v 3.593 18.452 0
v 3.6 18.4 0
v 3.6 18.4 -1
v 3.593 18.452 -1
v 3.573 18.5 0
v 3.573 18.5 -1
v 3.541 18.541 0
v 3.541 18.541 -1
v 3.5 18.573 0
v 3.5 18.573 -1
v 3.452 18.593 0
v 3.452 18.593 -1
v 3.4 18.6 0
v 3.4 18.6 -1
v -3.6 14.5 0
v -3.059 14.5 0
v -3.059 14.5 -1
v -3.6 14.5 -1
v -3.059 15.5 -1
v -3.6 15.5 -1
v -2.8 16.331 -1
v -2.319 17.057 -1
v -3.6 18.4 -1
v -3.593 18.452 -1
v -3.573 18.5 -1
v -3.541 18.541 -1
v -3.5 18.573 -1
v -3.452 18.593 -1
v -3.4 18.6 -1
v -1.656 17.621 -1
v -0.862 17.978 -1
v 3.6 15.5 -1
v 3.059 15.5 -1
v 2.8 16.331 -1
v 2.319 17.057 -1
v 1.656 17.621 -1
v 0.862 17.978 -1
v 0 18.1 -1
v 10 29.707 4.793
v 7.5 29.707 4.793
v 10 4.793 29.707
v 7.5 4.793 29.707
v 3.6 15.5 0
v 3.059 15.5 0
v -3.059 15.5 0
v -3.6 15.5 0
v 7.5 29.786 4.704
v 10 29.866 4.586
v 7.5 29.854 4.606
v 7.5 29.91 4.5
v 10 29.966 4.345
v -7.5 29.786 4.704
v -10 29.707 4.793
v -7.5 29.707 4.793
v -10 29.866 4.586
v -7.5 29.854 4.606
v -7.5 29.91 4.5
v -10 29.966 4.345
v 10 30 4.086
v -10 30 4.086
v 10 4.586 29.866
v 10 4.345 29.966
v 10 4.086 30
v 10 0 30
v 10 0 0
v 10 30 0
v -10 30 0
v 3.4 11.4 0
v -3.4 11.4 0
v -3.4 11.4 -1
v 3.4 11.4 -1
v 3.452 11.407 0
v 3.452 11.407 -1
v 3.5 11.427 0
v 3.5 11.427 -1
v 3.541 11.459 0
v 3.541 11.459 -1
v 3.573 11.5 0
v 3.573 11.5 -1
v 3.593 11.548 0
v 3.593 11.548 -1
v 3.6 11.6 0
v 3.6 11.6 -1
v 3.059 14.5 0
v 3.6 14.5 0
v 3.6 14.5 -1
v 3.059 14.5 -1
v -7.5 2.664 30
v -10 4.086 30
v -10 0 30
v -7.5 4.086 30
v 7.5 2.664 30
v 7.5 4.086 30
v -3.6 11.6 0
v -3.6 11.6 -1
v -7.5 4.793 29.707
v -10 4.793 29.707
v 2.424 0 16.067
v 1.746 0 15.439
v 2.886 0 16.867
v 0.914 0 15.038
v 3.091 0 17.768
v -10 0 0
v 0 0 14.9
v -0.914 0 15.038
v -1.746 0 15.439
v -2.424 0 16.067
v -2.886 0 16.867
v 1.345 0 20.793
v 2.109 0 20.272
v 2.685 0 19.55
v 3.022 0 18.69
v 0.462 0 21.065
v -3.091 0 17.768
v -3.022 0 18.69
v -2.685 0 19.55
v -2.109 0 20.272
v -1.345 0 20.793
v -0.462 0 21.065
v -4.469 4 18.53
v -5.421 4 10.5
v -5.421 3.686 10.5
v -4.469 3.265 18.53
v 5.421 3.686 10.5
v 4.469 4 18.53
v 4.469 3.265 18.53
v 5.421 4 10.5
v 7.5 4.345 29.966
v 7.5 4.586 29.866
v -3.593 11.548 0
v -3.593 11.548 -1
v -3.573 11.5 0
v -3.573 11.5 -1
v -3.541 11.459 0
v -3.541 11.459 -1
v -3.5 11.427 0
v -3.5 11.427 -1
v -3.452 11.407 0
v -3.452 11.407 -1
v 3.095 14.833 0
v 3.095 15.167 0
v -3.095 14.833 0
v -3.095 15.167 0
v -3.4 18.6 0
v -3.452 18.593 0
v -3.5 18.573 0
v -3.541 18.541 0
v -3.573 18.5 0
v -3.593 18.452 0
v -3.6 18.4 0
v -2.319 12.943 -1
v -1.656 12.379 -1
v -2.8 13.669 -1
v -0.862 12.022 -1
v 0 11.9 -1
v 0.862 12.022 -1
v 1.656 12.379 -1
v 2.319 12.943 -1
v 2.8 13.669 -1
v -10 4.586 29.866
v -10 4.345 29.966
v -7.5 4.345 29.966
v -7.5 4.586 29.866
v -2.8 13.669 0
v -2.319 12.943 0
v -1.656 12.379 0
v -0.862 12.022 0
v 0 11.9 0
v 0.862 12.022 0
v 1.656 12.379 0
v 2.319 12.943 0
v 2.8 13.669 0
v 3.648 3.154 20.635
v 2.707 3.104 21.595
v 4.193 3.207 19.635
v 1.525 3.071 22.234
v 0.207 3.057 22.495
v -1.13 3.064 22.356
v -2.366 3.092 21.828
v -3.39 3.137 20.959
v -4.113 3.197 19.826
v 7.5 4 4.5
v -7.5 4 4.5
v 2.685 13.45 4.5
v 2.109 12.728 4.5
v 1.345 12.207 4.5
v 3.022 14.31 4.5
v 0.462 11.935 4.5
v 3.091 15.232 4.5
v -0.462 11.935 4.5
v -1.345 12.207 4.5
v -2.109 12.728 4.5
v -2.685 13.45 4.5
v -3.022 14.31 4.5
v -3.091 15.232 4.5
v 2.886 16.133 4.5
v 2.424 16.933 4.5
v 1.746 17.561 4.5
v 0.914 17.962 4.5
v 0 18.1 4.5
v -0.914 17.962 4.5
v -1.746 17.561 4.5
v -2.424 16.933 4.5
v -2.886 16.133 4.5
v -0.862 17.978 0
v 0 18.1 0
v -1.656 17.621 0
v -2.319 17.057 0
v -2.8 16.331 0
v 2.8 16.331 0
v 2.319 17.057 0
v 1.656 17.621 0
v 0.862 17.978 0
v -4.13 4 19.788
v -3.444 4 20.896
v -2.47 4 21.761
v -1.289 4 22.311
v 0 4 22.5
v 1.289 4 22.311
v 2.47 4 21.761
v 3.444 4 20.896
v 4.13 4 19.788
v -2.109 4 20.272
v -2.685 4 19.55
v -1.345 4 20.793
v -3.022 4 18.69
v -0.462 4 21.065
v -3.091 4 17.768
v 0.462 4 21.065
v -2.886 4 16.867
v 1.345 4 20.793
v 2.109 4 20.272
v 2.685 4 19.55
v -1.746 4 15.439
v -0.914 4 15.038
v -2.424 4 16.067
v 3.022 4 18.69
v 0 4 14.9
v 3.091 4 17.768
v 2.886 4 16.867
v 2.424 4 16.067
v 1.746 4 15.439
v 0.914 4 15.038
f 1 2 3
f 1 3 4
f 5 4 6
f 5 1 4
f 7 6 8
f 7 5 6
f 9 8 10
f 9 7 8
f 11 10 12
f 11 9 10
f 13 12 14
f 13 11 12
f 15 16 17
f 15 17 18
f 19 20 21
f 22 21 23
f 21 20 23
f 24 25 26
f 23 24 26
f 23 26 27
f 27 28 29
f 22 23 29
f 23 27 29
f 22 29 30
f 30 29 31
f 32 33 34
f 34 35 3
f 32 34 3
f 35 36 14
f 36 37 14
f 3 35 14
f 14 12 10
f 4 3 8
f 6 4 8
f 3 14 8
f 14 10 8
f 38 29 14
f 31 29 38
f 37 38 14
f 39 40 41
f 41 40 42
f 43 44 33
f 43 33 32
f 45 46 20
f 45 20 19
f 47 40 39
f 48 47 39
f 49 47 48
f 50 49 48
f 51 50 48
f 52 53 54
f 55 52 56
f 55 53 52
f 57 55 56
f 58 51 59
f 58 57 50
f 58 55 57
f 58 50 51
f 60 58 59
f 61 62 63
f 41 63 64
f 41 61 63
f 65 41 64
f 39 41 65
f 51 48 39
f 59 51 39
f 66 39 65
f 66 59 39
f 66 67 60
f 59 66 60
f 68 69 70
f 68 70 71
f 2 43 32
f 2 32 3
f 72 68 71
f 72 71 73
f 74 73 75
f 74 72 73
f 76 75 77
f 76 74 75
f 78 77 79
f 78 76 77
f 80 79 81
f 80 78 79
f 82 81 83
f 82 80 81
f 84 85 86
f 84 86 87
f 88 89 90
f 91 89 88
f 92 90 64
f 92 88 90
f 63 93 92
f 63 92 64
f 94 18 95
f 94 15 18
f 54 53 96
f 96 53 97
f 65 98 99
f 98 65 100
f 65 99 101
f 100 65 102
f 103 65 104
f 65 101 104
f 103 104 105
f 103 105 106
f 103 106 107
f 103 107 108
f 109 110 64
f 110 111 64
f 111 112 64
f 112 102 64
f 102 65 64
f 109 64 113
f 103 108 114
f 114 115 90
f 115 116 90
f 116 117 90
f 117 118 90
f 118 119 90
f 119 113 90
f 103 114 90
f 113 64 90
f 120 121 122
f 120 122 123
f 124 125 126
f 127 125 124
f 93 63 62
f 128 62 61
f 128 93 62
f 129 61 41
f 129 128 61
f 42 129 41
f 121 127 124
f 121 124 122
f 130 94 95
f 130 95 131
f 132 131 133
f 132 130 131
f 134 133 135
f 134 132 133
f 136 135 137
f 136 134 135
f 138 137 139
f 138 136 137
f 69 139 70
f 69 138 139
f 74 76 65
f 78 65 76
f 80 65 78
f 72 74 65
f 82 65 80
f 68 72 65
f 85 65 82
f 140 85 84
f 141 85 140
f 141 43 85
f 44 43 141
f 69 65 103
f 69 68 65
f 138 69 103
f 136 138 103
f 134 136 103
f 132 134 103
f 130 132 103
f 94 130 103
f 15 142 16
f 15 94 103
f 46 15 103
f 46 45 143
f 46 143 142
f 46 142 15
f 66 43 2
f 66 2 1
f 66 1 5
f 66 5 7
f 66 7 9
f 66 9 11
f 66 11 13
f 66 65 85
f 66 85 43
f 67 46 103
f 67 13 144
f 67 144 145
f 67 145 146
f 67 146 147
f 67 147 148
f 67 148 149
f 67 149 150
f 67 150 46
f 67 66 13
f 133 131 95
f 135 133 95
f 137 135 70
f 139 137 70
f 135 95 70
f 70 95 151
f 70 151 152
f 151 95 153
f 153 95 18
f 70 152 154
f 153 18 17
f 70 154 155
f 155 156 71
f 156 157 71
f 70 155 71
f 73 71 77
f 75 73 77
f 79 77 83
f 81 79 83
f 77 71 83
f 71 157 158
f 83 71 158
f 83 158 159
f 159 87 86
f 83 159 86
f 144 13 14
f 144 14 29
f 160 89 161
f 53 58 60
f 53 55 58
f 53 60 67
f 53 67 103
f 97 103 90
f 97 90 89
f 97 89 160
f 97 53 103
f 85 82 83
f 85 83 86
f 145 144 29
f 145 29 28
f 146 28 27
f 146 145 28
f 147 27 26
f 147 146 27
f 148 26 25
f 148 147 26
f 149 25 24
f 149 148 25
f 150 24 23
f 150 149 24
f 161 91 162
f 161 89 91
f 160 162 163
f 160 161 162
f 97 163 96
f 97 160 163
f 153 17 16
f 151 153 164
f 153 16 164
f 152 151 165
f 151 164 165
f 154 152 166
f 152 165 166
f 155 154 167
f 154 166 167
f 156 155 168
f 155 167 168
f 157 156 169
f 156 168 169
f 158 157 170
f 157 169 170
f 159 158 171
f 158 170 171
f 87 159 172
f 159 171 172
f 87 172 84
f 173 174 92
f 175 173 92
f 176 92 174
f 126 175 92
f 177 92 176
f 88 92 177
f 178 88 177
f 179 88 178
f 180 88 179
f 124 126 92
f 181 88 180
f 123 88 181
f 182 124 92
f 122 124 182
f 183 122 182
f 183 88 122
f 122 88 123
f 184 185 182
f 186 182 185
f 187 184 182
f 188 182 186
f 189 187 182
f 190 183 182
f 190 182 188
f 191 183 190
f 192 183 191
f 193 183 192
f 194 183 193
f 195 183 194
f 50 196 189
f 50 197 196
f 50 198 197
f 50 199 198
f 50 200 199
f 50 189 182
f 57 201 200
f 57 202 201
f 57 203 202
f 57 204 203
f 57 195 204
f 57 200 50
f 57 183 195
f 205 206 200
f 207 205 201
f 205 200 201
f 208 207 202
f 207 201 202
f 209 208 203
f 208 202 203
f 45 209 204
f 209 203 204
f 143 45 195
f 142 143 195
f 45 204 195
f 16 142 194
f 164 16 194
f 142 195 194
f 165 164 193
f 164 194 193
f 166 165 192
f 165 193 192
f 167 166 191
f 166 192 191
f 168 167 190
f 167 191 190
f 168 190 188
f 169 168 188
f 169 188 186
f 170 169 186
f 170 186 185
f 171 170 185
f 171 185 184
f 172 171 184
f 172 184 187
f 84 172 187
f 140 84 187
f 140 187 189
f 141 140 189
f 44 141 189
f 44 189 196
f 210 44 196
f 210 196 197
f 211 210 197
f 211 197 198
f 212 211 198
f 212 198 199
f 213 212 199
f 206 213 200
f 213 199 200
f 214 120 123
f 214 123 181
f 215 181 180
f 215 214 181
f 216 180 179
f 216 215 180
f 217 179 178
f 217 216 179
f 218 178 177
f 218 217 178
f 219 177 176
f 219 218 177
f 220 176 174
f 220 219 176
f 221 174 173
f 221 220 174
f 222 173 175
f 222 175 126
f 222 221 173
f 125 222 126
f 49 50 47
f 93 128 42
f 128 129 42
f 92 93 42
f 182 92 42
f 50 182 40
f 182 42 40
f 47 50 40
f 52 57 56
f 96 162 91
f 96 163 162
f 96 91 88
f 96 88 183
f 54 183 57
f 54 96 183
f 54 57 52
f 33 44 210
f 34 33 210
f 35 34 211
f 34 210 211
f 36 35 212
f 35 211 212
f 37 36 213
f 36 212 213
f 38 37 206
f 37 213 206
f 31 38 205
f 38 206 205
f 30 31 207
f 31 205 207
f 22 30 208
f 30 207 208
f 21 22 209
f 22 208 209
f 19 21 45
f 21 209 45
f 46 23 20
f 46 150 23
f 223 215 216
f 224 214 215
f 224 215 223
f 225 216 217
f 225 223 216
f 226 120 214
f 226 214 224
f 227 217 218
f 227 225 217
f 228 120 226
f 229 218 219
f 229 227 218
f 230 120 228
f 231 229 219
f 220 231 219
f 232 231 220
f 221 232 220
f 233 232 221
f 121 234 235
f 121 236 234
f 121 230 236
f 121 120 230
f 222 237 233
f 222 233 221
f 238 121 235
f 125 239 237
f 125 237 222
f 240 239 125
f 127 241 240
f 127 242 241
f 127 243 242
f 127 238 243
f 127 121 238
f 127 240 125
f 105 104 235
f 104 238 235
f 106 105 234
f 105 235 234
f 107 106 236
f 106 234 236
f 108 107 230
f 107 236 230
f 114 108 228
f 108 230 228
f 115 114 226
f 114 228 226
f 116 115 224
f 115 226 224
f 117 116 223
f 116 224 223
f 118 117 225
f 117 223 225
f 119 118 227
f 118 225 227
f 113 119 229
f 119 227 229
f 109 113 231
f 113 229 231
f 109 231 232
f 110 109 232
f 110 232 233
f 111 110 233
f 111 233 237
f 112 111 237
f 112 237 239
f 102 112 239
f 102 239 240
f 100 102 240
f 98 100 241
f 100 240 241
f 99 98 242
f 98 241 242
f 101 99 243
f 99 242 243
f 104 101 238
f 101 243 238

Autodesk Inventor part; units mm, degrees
sketch "Sketch_15" plane through (0, 0, 0) normal (1, 0, 0) x (0, 1, 0)
  line L0 (0, 30) -> (0, 0)
  line L1 (0, 0) -> (30, 0)
  line L2 (30, 0) -> (30, 4.0858)
  arc A0 (30, 4.0858) -> (29.7071, 4.7929) centre (29, 4.0858) ccw
  line L3 (29.7071, 4.7929) -> (4.7929, 29.7071)
  arc A1 (4.7929, 29.7071) -> (4.0858, 30) centre (4.0858, 29) ccw
  line L4 (4.0858, 30) -> (0, 30)
extrude "Extrusion1" add sketch "Sketch_15" along normal mid plane 20
sketch "Sketch_16" plane through (0, 0, 0) normal (1, 0, 0) x (0, 1, 0)
  line L0 (2.9278, 34.5) -> (4.4738, 5)
  line L1 (4.4738, 5) -> (34.5, 5)
  line L2 (34.5, 5) -> (34.5, 34.5)
  line L3 (34.5, 34.5) -> (2.9278, 34.5)
extrude "Extrusion2" cut sketch "Sketch_16" along normal mid plane 15
sketch "Sketch_82" plane through (0, 0, 0) normal (1, 0, 0) x (0, 1, 0)
  line L0 (2.4278, 34.5) -> (4, 4.5)
  line L1 (4, 4.5) -> (34, 4.5)
  line L2 (34, 4.5) -> (34, 34.5)
  line L3 (34, 34.5) -> (2.4278, 34.5)
extrude "Extrusion3" cut sketch "Sketch_82" along normal mid plane 15
sketch "Sketch_17" plane through (0, 4.5, 0) normal (0, 1, 0) x (1, 0, 0)
  line L0 (-5.4209, -10.5) -> (-4.4687, -18.5299)
  arc A0 (-4.4687, -18.5299) -> (4.4687, -18.5299) centre (0, -18) ccw
  line L1 (4.4687, -18.5299) -> (5.4209, -10.5)
  line L2 (5.4209, -10.5) -> (-5.4209, -10.5)
extrude "Extrusion4" add sketch "Sketch_17" against normal blind 2.25
sketch "Sketch5" plane through (10, 0, 0) normal (0, 0, -1) x (-1, 0, 0)
  point P0 (10, 15)
hole "Hole1" at (0, 15, 0) direction (0, 0, 1) diameter 6.2 depth 5.5
sketch "Sketch6" plane through (-10, 0, 30) normal (0, -1, 0) x (1, 0, 0)
  point P0 (10, -12)
hole "Hole2" at (0, 0, 18) direction (0, 1, 0) diameter 6.2 depth 4.5
sketch "Sketch_1" plane through (0, 0, 0) normal (0, 1, 0) x (-1, 0, 0)
  line L0 (10, 0) -> (10, 30)
  line L1 (10, 30) -> (-10, 30)
  line L2 (-10, 30) -> (-10, 0)
  line L3 (-10, 0) -> (10, 0)
extrude "Extrusion5" add sketch "Sketch_1" against normal blind 1
sketch "Sketch_4" plane through (0, 0, 0) normal (0, 1, 0) x (-1, 0, 0)
  line L0 (10, 0) -> (10, 30)
  line L1 (10, 30) -> (-10, 30)
  line L2 (-10, 30) -> (-10, 0)
  line L3 (-10, 0) -> (10, 0)
extrude "Extrusion6" cut sketch "Sketch_4" against normal blind 1
sketch "Sketch_72" plane through (0, 0, 0) normal (0, 0, 1) x (1, 0, 0)
  line L0 (-3.6, 14.5) -> (-3.6, 11.6)
  arc A0 (-3.6, 11.6) -> (-3.4, 11.4) centre (-3.4, 11.6) ccw
  line L1 (-3.4, 11.4) -> (3.4, 11.4)
  arc A1 (3.4, 11.4) -> (3.6, 11.6) centre (3.4, 11.6) ccw
  line L2 (3.6, 11.6) -> (3.6, 14.5)
  line L3 (3.6, 14.5) -> (3.0594, 14.5)
  arc A2 (-3.0594, 14.5) -> (3.0594, 14.5) centre (0, 15) ccw
  line L4 (-3.0594, 14.5) -> (-3.6, 14.5)
extrude "Extrusion7" add sketch "Sketch_72" against normal blind 1
sketch "Sketch_73" plane through (0, 0, 0) normal (0, 0, 1) x (1, 0, 0)
  line L0 (-3.6, 15.5) -> (-3.0594, 15.5)
  arc A0 (3.0594, 15.5) -> (-3.0594, 15.5) centre (0, 15) ccw
  line L1 (3.0594, 15.5) -> (3.6, 15.5)
  line L2 (3.6, 15.5) -> (3.6, 18.4)
  arc A1 (3.6, 18.4) -> (3.4, 18.6) centre (3.4, 18.4) ccw
  line L3 (3.4, 18.6) -> (-3.4, 18.6)
  arc A2 (-3.4, 18.6) -> (-3.6, 18.4) centre (-3.4, 18.4) ccw
  line L4 (-3.6, 18.4) -> (-3.6, 15.5)
extrude "Extrusion8" add sketch "Sketch_73" against normal blind 1
sketch "Sketch_86" plane through (0, 4.5, 0) normal (0, 1, 0) x (1, 0, 0)
  line L0 (-5.4209, -10.5) -> (-4.4687, -18.5299)
  arc A0 (-4.4687, -18.5299) -> (4.4687, -18.5299) centre (0, -18) ccw
  line L1 (4.4687, -18.5299) -> (5.4209, -10.5)
  line L2 (5.4209, -10.5) -> (-5.4209, -10.5)
extrude "Extrusion9" cut sketch "Sketch_86" against normal blind 0.5
ref_plane "SD6_50_1_XY" through (-10, 15, 4.5) normal (0, 0, 1) x (1, 0, 0)
ref_plane "SD6_50_1_YZ" through (-10, 15, 4.5) normal (1, 0, 0) x (0, 1, 0)
ref_plane "SD6_50_1_ZX" through (-10, 15, 4.5) normal (0, 1, 0) x (0, 0, 1)
ref_plane "SD6_50_2_XY" through (10, 15, 4.5) normal (0, 0, 1) x (1, 0, 0)
ref_plane "SD6_50_2_YZ" through (10, 15, 4.5) normal (1, 0, 0) x (0, 1, 0)
ref_plane "SD6_50_2_ZX" through (10, 15, 4.5) normal (0, 1, 0) x (0, 0, 1)
ref_plane "SD6_50_3_XY" through (-10, 4.5, 18) normal (0, 1, 0) x (1, 0, 0)
ref_plane "SD6_50_3_YZ" through (-10, 4.5, 18) normal (1, 0, 0) x (0, 0, -1)
ref_plane "SD6_50_3_ZX" through (-10, 4.5, 18) normal (0, 0, -1) x (0, 1, 0)
ref_plane "SD6_50_4_XY" through (10, 4.5, 18) normal (0, 1, 0) x (1, 0, 0)
ref_plane "SD6_50_4_YZ" through (10, 4.5, 18) normal (1, 0, 0) x (0, 0, -1)
ref_plane "SD6_50_4_ZX" through (10, 4.5, 18) normal (0, 0, -1) x (0, 1, 0)
ref_plane "a10_to_bolt_XY" through (15, 15, 4.5) normal (0, 0, 1) x (1, 0, 0)
ref_plane "a10_to_bolt_YZ" through (15, 15, 4.5) normal (1, 0, 0) x (0, 1, 0)
ref_plane "a10_to_bolt_ZX" through (15, 15, 4.5) normal (0, 1, 0) x (0, 0, 1)
ref_plane "a11_to_bolt_XY" through (-15, 4.5, 18) normal (0, 1, 0) x (1, 0, 0)
ref_plane "a11_to_bolt_YZ" through (-15, 4.5, 18) normal (1, 0, 0) x (0, 0, -1)
ref_plane "a11_to_bolt_ZX" through (-15, 4.5, 18) normal (0, 0, -1) x (0, 1, 0)
ref_plane "a12_to_bolt_XY" through (15, 4.5, 18) normal (0, 1, 0) x (1, 0, 0)
ref_plane "a12_to_bolt_YZ" through (15, 4.5, 18) normal (1, 0, 0) x (0, 0, -1)
ref_plane "a12_to_bolt_ZX" through (15, 4.5, 18) normal (0, 0, -1) x (0, 1, 0)
ref_plane "a13_to_bolt_XY" through (0, 4.5, 38) normal (0, 1, 0) x (1, 0, 0)
ref_plane "a13_to_bolt_YZ" through (0, 4.5, 38) normal (1, 0, 0) x (0, 0, -1)
ref_plane "a13_to_bolt_ZX" through (0, 4.5, 38) normal (0, 0, -1) x (0, 1, 0)
ref_plane "a14_to_bolt_XY" through (0, 30, 4.5) normal (0, 0, 1) x (1, 0, 0)
ref_plane "a14_to_bolt_YZ" through (0, 30, 4.5) normal (1, 0, 0) x (0, 1, 0)
ref_plane "a14_to_bolt_ZX" through (0, 30, 4.5) normal (0, 1, 0) x (0, 0, 1)
ref_plane "a1_to_bolt_XY" through (-10, 20, 4.5) normal (0, 0, 1) x (1, 0, 0)
ref_plane "a1_to_bolt_YZ" through (-10, 20, 4.5) normal (1, 0, 0) x (0, 1, 0)
ref_plane "a1_to_bolt_ZX" through (-10, 20, 4.5) normal (0, 1, 0) x (0, 0, 1)
ref_plane "a2_to_bolt_XY" through (-10, 4.5, 15) normal (0, 1, 0) x (1, 0, 0)
ref_plane "a2_to_bolt_YZ" through (-10, 4.5, 15) normal (1, 0, 0) x (0, 0, -1)
ref_plane "a2_to_bolt_ZX" through (-10, 4.5, 15) normal (0, 0, -1) x (0, 1, 0)
ref_plane "a3_to_bolt_XY" through (1, 15, 4.5) normal (0, 0, 1) x (1, 0, 0)
ref_plane "a3_to_bolt_YZ" through (1, 15, 4.5) normal (1, 0, 0) x (0, 1, 0)
ref_plane "a3_to_bolt_ZX" through (1, 15, 4.5) normal (0, 1, 0) x (0, 0, 1)
ref_plane "a4_to_bolt_XY" through (1, 4, 18) normal (0, 1, 0) x (1, 0, 0)
ref_plane "a4_to_bolt_YZ" through (1, 4, 18) normal (1, 0, 0) x (0, 0, -1)
ref_plane "a4_to_bolt_ZX" through (1, 4, 18) normal (0, 0, -1) x (0, 1, 0)
ref_plane "a55_to_bolt_XY" through (0, 18, 4.5) normal (0, 0, 1) x (1, 0, 0)
ref_plane "a55_to_bolt_YZ" through (0, 18, 4.5) normal (1, 0, 0) x (0, 1, 0)
ref_plane "a55_to_bolt_ZX" through (0, 18, 4.5) normal (0, 1, 0) x (0, 0, 1)
ref_plane "a5_to_bolt_XY" through (0, 15, 4.5) normal (0, 0, 1) x (1, 0, 0)
ref_plane "a5_to_bolt_YZ" through (0, 15, 4.5) normal (1, 0, 0) x (0, 1, 0)
ref_plane "a5_to_bolt_ZX" through (0, 15, 4.5) normal (0, 1, 0) x (0, 0, 1)
ref_plane "a6_to_bolt_XY" through (0, 4, 18) normal (0, 1, 0) x (1, 0, 0)
ref_plane "a6_to_bolt_YZ" through (0, 4, 18) normal (1, 0, 0) x (0, 0, -1)
ref_plane "a6_to_bolt_ZX" through (0, 4, 18) normal (0, 0, -1) x (0, 1, 0)
ref_plane "a7_to_bolt_XY" through (0, 35, 4.5) normal (0, 0, 1) x (1, 0, 0)
ref_plane "a7_to_bolt_YZ" through (0, 35, 4.5) normal (1, 0, 0) x (0, 1, 0)
ref_plane "a7_to_bolt_ZX" through (0, 35, 4.5) normal (0, 1, 0) x (0, 0, 1)
ref_plane "a8_to_bolt_XY" through (0, 4.5, 48) normal (0, 1, 0) x (1, 0, 0)
ref_plane "a8_to_bolt_YZ" through (0, 4.5, 48) normal (1, 0, 0) x (0, 0, -1)
ref_plane "a8_to_bolt_ZX" through (0, 4.5, 48) normal (0, 0, -1) x (0, 1, 0)
ref_plane "a9_to_bolt_XY" through (-15, 15, 4.5) normal (0, 0, 1) x (1, 0, 0)
ref_plane "a9_to_bolt_YZ" through (-15, 15, 4.5) normal (1, 0, 0) x (0, 1, 0)
ref_plane "a9_to_bolt_ZX" through (-15, 15, 4.5) normal (0, 1, 0) x (0, 0, 1)
ref_plane "bracket_to_dummy_XY" through (0, 0, 0) normal (0, 1, 0) x (1, 0, 0)
ref_plane "bracket_to_dummy_YZ" through (0, 0, 0) normal (1, 0, 0) x (0, 0, -1)
ref_plane "bracket_to_dummy_ZX" through (0, 0, 0) normal (0, 0, -1) x (0, 1, 0)
ref_plane "hole_x1_bolt_XY" through (-10, 35, 4.5) normal (0, 0, 1) x (1, 0, 0)
ref_plane "hole_x1_bolt_YZ" through (-10, 35, 4.5) normal (1, 0, 0) x (0, 1, 0)
ref_plane "hole_x1_bolt_ZX" through (-10, 35, 4.5) normal (0, 1, 0) x (0, 0, 1)
ref_plane "holex2_to_bolt_XY" through (10, 35, 4.5) normal (0, 0, 1) x (1, 0, 0)
ref_plane "holex2_to_bolt_YZ" through (10, 35, 4.5) normal (1, 0, 0) x (0, 1, 0)
ref_plane "holex2_to_bolt_ZX" through (10, 35, 4.5) normal (0, 1, 0) x (0, 0, 1)
ref_plane "holex3_to_bolt_XY" through (10, 4.5, 35) normal (0, 1, 0) x (1, 0, 0)
ref_plane "holex3_to_bolt_YZ" through (10, 4.5, 35) normal (1, 0, 0) x (0, 0, -1)
ref_plane "holex3_to_bolt_ZX" through (10, 4.5, 35) normal (0, 0, -1) x (0, 1, 0)
ref_plane "holex4_to_bolt_XY" through (10, 4.5, 15) normal (0, 1, 0) x (1, 0, 0)
ref_plane "holex4_to_bolt_YZ" through (10, 4.5, 15) normal (1, 0, 0) x (0, 0, -1)
ref_plane "holex4_to_bolt_ZX" through (10, 4.5, 15) normal (0, 0, -1) x (0, 1, 0)
ref_plane "holex5_to_bolt_XY" through (-10, 4.5, 35) normal (0, 1, 0) x (1, 0, 0)
ref_plane "holex5_to_bolt_YZ" through (-10, 4.5, 35) normal (1, 0, 0) x (0, 0, -1)
ref_plane "holex5_to_bolt_ZX" through (-10, 4.5, 35) normal (0, 0, -1) x (0, 1, 0)
ref_plane "holex6_to_bolt_XY" through (10, 20, 4.5) normal (0, 0, 1) x (1, 0, 0)
ref_plane "holex6_to_bolt_YZ" through (10, 20, 4.5) normal (1, 0, 0) x (0, 1, 0)
ref_plane "holex6_to_bolt_ZX" through (10, 20, 4.5) normal (0, 1, 0) x (0, 0, 1)
properties part number "HBLFSNE6_"
